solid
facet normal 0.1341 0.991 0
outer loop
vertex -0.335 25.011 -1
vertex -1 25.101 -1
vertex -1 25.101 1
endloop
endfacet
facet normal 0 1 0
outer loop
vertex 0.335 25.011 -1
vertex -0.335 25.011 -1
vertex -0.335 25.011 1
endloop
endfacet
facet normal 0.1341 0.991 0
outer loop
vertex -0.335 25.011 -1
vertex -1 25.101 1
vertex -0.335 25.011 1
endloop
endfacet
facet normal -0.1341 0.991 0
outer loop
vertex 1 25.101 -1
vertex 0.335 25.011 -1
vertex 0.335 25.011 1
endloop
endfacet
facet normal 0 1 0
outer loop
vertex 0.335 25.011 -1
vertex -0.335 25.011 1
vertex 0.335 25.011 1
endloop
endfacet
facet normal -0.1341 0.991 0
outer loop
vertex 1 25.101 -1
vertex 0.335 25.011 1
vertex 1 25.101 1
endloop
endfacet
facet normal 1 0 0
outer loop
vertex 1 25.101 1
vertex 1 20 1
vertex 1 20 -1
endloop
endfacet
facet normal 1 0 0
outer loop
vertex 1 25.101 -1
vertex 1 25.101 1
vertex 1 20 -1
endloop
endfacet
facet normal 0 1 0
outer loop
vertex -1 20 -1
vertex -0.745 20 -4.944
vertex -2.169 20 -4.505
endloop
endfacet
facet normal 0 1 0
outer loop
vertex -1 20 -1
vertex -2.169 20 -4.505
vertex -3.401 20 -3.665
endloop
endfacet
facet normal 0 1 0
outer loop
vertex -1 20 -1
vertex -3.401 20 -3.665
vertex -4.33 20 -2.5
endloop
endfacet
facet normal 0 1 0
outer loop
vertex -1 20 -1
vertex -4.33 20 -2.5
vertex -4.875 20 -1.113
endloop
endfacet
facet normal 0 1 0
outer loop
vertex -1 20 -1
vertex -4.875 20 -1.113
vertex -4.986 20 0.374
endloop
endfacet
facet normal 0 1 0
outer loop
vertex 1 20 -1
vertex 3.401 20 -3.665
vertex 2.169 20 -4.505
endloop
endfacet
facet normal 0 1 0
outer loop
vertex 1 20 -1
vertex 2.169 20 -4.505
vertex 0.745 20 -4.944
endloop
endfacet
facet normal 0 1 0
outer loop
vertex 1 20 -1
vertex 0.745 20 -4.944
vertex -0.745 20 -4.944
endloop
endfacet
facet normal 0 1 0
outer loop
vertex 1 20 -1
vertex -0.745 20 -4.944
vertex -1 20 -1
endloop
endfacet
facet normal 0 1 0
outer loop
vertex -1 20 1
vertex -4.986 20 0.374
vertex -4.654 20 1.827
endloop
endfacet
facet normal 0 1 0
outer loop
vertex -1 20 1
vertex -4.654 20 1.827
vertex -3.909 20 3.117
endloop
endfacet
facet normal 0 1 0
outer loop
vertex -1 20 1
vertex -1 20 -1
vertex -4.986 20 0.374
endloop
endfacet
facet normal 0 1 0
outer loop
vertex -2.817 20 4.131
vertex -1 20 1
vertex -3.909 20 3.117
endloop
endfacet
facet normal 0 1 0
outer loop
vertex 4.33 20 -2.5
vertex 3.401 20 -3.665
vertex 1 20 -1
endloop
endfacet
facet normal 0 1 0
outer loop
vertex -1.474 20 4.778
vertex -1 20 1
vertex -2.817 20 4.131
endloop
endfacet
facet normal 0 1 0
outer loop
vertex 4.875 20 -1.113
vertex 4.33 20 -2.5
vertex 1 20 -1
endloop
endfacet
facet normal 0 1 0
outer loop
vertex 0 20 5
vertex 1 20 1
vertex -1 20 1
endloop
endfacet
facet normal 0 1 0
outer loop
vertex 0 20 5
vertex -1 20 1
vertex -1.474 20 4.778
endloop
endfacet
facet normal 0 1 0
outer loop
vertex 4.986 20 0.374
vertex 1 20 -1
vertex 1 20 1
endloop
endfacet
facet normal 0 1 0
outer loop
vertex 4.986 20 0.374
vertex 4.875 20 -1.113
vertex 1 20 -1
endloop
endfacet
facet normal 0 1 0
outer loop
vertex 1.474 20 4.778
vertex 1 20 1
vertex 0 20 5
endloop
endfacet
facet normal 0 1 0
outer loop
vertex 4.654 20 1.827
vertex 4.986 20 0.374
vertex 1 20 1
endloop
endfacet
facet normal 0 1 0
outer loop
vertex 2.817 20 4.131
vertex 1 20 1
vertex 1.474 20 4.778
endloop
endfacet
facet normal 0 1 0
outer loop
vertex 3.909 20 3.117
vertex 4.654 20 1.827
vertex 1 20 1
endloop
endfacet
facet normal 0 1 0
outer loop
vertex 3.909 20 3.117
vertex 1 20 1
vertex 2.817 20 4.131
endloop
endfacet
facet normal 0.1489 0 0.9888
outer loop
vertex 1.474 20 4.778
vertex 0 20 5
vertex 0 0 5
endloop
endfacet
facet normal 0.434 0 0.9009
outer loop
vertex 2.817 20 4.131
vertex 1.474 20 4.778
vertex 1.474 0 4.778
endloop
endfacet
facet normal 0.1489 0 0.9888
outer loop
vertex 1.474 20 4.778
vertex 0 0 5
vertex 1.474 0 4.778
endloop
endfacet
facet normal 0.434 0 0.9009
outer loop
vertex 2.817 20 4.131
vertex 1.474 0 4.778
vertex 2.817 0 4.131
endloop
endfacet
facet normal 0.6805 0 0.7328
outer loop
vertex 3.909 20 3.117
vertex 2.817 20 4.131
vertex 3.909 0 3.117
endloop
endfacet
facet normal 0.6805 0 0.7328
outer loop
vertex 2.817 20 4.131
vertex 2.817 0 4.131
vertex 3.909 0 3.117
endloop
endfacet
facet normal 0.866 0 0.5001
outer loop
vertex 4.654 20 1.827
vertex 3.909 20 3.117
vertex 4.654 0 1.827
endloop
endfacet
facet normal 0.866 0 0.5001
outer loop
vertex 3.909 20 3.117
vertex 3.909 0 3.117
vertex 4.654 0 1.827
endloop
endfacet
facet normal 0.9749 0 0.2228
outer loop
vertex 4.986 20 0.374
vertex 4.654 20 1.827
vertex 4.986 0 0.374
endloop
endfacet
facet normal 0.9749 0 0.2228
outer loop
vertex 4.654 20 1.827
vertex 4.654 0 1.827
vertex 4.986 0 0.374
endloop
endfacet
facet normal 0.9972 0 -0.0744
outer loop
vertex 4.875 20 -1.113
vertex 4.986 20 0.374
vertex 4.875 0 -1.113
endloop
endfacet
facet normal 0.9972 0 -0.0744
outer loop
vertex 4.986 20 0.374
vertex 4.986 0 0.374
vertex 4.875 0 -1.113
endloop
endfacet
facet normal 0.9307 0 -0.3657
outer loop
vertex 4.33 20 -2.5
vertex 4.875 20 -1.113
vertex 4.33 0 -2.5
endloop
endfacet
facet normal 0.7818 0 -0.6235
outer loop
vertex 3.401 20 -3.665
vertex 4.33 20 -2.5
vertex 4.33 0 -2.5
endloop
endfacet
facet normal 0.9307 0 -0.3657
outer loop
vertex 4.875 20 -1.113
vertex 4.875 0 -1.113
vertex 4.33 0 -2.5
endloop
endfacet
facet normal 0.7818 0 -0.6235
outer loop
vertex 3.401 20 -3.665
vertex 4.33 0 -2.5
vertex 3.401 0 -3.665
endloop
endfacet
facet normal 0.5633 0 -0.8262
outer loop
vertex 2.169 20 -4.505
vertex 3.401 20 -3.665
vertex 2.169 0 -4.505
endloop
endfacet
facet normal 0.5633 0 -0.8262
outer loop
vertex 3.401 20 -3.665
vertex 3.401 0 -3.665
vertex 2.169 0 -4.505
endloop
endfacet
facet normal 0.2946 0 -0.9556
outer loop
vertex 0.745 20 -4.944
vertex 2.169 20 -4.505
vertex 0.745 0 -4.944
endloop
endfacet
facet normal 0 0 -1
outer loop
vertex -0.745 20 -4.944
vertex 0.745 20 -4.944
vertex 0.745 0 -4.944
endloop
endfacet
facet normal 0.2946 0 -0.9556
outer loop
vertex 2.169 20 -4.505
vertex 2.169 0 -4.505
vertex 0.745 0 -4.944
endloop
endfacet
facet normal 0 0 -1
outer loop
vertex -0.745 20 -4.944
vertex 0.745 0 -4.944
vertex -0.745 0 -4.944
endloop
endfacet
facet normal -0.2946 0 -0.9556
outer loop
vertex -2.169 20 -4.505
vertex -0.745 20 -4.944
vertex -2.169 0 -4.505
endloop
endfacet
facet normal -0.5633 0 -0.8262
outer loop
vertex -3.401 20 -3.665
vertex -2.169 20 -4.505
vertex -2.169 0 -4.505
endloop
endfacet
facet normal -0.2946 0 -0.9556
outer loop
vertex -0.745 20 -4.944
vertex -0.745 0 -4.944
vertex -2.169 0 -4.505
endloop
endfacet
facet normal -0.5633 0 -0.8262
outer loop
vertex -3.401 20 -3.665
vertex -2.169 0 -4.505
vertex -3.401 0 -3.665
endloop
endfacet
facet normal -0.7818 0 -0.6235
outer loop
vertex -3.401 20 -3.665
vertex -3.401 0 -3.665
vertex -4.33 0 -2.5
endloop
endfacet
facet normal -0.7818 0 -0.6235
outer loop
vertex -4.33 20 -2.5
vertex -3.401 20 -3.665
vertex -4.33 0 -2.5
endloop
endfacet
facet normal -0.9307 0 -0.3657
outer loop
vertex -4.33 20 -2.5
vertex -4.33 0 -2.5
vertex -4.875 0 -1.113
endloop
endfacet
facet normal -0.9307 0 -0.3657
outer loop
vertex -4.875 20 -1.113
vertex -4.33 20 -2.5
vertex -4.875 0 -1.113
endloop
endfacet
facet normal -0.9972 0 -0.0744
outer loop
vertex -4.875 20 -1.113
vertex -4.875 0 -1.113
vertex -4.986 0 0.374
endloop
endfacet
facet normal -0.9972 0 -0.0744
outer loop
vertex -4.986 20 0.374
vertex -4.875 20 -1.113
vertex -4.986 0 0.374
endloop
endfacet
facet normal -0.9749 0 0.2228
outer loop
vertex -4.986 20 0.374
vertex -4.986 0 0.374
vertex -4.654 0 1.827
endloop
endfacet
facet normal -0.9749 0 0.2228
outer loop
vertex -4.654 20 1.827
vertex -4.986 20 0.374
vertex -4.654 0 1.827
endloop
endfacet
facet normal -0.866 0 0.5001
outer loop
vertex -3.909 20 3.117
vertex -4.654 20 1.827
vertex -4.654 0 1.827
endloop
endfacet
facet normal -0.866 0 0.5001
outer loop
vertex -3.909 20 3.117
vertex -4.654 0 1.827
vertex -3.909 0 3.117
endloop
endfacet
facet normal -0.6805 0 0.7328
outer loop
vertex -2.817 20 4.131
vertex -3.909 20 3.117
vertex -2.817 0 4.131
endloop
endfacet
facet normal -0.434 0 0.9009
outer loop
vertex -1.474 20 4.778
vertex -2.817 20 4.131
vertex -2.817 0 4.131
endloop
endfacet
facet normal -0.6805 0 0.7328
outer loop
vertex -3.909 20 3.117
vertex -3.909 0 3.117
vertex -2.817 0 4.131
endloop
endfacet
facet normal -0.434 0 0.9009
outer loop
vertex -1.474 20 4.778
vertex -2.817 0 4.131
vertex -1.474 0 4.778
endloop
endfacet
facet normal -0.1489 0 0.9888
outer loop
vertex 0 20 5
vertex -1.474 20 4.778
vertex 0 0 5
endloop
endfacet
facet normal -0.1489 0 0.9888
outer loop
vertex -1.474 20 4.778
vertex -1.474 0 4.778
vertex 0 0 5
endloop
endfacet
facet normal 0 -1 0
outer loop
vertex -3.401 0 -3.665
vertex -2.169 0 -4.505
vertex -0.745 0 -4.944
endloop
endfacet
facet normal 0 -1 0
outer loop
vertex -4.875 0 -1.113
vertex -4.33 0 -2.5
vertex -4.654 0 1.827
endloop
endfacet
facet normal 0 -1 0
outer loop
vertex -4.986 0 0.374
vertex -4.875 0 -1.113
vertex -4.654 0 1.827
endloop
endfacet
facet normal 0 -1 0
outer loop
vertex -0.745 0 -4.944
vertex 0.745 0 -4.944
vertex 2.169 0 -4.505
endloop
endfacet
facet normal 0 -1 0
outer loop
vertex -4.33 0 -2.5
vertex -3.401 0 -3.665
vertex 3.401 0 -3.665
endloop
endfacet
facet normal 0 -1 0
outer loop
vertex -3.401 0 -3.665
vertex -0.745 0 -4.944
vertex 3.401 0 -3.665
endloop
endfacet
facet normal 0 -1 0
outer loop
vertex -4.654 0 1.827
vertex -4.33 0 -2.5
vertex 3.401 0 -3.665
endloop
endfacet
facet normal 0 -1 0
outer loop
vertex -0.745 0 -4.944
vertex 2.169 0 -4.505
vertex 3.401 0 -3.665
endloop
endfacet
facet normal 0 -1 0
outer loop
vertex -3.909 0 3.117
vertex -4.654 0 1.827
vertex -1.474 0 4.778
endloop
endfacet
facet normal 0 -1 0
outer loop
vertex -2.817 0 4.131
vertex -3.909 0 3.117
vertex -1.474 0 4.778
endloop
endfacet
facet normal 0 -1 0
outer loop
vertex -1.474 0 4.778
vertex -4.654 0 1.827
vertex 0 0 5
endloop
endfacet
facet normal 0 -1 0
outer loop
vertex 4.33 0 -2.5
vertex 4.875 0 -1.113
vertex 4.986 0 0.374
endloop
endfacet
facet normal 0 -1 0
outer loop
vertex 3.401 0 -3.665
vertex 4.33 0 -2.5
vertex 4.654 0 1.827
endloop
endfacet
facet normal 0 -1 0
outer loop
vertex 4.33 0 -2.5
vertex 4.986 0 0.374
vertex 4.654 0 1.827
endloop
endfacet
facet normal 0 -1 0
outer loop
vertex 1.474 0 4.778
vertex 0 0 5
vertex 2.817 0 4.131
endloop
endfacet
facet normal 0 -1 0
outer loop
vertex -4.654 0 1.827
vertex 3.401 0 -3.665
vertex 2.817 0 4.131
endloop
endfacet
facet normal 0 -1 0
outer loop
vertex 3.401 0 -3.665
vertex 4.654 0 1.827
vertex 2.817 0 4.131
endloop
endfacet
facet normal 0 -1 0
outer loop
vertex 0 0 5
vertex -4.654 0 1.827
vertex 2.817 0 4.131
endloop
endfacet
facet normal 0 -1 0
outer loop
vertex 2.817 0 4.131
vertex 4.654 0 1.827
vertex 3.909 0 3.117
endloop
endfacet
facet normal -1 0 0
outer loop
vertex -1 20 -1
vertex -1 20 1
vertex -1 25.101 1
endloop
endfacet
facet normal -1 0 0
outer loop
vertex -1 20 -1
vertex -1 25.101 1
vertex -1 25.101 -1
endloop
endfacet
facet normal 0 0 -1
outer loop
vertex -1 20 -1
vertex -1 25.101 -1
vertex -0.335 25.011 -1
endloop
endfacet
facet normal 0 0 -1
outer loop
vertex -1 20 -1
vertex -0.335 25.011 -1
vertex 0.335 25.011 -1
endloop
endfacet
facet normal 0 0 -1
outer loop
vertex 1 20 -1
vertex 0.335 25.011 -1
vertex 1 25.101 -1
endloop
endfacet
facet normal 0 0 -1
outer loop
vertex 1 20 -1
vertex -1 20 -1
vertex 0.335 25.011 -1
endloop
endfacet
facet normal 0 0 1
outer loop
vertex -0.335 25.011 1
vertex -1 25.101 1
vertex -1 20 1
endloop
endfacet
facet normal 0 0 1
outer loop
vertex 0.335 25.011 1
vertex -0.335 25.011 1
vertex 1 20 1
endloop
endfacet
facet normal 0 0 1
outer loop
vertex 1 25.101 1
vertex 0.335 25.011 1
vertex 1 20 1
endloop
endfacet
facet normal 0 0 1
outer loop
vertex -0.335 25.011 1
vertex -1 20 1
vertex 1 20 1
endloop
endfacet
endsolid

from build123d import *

# Parameters (mm, degrees)
SKETCH1_R           = 5
BOSS_EXTRUDE1_DEPTH = 20
SKETCH2_W           = 2
SKETCH2_H           = 2
BOSS_EXTRUDE2_DEPTH = 10
SKETCH3_R           = 5
CUT_EXTRUDE1_DEPTH  = 32


with BuildPart() as part:
    # Sketch1 → Boss-Extrude1 (new body)
    with BuildSketch(Plane(origin=(0, 0, 0), x_dir=(1, 0, 0), z_dir=(0, 1, 0))):
        with Locations(Location((0, 0, 0), (0, 0, 270))):
            Circle(SKETCH1_R)
    extrude(amount=BOSS_EXTRUDE1_DEPTH)

    # Sketch2 → Boss-Extrude2 (add)
    with BuildSketch(Plane(origin=(0, 20, 0), x_dir=(1, 0, 0), z_dir=(0, 1, 0))):
        Rectangle(SKETCH2_W, SKETCH2_H)
    extrude(amount=BOSS_EXTRUDE2_DEPTH)

    # Sketch3 → Cut-Extrude1 (cut, through all)
    with BuildSketch(Plane.XY.offset(1)):
        with Locations((0, 30)):
            Circle(SKETCH3_R)
    extrude(amount=-CUT_EXTRUDE1_DEPTH, mode=Mode.SUBTRACT)


solid = part.part
